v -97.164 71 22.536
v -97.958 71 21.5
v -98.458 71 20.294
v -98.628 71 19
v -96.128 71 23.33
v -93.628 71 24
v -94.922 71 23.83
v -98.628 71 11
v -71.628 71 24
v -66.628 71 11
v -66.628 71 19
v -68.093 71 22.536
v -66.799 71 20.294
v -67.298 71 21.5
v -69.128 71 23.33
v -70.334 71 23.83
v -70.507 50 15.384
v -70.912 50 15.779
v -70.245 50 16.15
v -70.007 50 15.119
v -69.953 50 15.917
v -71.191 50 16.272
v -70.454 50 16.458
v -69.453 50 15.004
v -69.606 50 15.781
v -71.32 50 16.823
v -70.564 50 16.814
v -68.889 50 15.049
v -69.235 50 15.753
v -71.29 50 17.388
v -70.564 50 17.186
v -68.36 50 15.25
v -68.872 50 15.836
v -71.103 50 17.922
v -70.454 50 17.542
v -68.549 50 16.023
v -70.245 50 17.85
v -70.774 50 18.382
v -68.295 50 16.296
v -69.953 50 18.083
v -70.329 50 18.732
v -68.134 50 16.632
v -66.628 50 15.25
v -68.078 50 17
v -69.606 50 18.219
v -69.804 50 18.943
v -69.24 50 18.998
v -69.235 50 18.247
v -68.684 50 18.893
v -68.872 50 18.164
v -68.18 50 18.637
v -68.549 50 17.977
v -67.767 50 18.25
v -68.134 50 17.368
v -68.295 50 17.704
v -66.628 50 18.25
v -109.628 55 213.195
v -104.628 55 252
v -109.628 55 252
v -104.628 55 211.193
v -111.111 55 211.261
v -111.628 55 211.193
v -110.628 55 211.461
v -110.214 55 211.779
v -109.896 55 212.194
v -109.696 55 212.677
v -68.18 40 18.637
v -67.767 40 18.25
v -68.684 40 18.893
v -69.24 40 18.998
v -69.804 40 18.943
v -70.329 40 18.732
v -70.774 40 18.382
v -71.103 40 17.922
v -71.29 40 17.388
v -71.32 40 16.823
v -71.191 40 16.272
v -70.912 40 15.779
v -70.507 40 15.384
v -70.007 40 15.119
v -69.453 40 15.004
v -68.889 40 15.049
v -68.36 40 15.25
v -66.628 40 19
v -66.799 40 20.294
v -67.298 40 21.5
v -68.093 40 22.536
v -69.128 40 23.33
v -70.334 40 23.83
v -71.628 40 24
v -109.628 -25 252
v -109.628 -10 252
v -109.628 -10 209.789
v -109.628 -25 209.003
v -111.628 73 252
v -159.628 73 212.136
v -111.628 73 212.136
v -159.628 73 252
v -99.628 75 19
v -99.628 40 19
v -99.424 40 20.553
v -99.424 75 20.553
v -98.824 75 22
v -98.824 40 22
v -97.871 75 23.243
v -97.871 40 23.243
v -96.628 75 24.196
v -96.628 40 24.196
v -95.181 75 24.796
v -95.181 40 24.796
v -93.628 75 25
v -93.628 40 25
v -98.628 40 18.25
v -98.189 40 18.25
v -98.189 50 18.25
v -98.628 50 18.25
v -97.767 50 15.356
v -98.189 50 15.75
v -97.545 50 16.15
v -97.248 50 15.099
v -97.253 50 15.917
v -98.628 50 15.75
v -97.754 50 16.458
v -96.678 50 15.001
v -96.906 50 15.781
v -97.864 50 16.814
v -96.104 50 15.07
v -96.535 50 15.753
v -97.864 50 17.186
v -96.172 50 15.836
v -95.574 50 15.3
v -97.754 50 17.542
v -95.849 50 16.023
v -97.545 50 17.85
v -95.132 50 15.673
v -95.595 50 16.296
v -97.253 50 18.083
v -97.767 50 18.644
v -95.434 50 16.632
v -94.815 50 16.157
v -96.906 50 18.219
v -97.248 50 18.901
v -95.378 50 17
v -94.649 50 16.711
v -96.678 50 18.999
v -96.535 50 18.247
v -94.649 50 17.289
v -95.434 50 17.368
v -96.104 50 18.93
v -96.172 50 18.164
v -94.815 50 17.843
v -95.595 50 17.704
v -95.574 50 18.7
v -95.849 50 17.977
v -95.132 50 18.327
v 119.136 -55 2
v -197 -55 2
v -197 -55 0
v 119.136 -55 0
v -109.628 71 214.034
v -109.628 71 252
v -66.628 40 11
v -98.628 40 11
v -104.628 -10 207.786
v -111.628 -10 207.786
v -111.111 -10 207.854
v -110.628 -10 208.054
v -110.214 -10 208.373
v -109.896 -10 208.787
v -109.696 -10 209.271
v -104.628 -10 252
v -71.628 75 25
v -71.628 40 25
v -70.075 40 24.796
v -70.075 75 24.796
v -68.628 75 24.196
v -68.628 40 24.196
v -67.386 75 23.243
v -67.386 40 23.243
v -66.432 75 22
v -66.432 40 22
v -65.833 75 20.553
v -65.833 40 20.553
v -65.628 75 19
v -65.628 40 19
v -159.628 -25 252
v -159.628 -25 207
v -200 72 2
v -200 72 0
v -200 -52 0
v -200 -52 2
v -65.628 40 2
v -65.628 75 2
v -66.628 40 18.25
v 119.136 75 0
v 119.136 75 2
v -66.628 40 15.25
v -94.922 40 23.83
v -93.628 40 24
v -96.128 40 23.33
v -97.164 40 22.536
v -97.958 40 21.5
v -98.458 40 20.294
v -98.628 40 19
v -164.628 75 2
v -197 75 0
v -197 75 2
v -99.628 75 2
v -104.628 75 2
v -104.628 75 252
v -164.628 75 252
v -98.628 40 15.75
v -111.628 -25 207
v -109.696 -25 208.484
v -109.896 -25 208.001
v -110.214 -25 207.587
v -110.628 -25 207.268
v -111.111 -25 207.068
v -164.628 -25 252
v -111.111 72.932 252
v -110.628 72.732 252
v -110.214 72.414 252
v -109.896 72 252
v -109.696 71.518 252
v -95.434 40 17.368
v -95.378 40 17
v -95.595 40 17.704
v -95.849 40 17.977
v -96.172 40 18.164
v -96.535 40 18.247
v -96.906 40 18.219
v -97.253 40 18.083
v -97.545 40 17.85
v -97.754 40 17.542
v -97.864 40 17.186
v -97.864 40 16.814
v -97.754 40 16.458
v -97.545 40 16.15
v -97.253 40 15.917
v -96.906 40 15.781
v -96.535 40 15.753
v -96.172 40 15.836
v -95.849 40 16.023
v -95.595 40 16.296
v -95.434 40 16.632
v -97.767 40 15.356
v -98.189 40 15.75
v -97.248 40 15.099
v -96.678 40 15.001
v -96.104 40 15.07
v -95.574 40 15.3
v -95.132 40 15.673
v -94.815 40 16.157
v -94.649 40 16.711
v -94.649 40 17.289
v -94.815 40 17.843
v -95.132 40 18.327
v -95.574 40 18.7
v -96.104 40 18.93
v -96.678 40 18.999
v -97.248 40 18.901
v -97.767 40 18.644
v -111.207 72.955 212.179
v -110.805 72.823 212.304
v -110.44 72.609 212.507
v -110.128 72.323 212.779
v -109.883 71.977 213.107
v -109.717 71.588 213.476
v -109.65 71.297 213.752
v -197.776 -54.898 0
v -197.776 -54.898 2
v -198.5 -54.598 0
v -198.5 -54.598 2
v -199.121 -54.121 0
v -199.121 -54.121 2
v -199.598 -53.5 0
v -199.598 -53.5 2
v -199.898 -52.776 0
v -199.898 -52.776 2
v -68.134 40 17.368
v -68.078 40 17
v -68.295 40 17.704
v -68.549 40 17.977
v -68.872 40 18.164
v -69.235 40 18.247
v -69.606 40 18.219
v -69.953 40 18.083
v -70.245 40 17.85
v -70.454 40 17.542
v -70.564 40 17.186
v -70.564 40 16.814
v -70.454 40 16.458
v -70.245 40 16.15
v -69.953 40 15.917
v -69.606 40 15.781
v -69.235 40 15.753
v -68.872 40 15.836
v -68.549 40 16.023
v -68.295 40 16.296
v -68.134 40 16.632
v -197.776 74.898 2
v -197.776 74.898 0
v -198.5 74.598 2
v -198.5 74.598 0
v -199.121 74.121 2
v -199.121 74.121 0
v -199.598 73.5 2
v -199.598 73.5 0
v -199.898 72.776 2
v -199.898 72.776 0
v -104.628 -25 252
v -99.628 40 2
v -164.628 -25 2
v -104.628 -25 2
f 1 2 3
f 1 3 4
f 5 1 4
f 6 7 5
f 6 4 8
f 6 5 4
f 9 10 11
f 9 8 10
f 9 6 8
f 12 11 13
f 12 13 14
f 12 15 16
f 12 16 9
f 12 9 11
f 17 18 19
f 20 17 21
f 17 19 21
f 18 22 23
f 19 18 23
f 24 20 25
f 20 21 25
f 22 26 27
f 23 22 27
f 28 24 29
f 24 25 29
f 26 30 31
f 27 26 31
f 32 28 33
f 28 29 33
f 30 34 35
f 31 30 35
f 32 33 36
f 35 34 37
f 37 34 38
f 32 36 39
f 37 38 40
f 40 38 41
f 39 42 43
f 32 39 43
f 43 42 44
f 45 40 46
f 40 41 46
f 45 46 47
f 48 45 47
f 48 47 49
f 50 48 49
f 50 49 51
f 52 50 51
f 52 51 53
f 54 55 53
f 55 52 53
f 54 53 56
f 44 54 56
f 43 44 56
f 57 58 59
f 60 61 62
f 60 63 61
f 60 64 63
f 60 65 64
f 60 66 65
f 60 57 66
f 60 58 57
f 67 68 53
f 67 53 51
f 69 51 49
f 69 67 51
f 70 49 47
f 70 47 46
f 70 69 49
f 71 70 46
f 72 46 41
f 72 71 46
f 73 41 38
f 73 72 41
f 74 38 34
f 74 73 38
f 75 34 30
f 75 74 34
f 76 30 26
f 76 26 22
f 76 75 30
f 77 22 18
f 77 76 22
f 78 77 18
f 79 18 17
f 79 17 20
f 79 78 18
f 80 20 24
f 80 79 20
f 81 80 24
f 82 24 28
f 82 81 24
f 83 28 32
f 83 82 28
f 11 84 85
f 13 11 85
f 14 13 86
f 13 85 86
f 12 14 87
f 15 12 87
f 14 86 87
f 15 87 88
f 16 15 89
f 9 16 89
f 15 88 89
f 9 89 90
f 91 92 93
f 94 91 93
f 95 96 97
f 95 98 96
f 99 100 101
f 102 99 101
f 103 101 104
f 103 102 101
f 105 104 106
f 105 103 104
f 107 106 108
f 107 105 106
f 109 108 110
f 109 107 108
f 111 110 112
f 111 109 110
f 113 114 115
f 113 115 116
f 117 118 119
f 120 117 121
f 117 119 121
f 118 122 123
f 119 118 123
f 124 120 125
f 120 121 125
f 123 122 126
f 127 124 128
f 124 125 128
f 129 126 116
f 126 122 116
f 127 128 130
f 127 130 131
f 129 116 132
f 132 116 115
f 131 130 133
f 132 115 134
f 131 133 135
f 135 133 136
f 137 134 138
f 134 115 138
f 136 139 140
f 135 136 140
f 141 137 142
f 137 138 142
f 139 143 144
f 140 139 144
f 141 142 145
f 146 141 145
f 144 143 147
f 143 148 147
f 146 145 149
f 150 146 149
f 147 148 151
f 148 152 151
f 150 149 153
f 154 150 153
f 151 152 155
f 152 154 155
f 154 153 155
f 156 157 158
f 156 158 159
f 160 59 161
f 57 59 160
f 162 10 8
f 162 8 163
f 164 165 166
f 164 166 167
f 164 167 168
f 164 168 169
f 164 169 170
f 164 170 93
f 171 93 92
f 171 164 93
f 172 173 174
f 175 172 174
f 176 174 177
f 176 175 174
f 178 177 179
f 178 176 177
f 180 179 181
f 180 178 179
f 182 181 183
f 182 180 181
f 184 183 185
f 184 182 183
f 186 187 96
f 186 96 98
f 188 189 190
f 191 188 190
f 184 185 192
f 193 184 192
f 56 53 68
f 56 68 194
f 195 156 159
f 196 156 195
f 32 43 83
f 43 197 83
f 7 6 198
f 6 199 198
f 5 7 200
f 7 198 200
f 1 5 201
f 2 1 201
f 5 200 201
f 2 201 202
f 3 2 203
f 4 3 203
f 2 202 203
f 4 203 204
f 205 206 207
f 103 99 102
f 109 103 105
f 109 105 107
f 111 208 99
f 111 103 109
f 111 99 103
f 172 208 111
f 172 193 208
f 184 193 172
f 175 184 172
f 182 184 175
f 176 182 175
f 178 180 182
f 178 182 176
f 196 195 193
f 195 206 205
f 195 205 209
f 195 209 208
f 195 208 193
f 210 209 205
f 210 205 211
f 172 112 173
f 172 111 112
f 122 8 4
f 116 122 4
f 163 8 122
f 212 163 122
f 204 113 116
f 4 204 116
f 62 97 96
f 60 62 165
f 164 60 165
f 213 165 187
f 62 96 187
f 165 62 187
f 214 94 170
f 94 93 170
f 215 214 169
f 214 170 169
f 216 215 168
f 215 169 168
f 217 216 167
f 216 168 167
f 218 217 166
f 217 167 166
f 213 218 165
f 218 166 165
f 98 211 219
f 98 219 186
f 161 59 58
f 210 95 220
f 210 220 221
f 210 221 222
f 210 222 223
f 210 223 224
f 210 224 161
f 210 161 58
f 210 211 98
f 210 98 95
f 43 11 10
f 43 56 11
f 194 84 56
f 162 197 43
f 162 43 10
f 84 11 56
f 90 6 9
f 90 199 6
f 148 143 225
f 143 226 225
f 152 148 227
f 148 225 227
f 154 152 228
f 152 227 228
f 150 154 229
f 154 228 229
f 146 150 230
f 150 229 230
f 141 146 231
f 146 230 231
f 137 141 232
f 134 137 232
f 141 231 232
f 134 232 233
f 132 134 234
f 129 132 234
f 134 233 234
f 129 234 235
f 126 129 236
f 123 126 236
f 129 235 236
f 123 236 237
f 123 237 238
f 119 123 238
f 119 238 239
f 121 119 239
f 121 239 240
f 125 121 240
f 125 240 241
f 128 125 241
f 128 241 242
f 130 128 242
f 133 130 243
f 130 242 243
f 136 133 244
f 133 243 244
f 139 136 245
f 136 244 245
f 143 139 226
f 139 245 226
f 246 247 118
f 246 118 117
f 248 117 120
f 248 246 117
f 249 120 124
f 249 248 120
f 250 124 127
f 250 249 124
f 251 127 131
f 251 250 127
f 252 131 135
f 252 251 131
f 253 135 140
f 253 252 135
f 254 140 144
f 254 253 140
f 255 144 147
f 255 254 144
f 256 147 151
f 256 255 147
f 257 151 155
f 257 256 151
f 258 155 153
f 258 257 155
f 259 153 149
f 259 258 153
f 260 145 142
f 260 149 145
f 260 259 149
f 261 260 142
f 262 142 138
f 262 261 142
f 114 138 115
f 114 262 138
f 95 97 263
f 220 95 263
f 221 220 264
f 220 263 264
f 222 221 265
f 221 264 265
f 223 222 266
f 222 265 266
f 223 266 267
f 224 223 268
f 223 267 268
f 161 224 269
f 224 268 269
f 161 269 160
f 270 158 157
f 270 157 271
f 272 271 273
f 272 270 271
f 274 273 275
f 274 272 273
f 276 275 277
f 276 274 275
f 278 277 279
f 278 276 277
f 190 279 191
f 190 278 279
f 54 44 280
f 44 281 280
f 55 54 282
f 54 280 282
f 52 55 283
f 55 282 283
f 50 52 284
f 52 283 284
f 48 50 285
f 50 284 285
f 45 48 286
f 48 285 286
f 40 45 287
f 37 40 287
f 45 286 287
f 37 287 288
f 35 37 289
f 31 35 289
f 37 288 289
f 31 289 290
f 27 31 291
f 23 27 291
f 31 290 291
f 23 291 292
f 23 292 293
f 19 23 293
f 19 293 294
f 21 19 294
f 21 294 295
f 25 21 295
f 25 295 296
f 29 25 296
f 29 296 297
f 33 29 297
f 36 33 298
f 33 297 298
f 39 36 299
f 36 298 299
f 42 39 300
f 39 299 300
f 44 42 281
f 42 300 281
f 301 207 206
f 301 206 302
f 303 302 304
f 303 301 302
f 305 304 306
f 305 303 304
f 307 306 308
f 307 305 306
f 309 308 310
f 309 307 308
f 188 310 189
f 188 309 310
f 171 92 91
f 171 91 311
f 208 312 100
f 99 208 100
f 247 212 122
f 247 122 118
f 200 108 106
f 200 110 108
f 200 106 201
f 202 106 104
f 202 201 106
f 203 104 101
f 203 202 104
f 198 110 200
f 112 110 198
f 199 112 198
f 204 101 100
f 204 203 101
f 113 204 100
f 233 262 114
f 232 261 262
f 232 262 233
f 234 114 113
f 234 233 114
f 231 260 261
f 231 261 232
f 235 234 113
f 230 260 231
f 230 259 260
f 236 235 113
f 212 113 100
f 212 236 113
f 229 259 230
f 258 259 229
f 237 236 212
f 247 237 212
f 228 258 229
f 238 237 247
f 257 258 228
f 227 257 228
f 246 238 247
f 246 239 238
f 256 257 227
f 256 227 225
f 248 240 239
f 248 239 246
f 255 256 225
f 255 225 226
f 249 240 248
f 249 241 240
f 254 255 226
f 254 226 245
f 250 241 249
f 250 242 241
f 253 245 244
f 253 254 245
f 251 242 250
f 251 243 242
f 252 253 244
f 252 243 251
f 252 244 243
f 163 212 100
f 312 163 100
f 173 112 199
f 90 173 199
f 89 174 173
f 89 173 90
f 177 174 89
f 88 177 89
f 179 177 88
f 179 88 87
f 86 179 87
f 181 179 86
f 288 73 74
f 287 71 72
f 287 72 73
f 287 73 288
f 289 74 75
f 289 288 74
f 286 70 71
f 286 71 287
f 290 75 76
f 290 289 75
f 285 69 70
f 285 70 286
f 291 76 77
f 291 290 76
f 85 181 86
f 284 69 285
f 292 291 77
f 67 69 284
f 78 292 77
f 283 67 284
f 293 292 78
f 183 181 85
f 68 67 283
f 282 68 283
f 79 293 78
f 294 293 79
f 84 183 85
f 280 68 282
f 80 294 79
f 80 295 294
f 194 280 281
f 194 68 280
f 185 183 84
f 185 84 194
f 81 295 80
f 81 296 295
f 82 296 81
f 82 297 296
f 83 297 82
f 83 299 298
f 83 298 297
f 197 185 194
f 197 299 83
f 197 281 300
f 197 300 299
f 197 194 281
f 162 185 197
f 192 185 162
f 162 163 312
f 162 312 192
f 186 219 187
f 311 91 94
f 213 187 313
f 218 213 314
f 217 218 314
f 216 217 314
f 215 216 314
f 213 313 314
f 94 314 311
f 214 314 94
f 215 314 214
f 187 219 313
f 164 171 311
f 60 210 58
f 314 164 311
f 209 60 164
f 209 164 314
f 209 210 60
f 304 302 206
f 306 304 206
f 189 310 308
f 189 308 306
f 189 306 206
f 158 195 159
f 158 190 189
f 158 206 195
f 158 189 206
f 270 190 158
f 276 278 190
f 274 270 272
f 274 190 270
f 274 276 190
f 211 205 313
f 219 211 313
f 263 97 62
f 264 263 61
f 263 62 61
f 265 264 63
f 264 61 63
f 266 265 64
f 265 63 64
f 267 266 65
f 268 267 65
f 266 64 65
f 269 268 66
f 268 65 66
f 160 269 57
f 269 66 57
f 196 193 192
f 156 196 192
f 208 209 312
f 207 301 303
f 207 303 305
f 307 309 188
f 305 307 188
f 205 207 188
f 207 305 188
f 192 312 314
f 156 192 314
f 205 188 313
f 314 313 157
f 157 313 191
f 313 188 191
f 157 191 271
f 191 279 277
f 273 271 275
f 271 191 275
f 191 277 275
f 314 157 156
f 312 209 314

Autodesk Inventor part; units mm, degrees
ref_plane "YZ Plane" through (0, 0, 0) normal (1, 0, 0) x (0, 1, 0)
ref_plane "XZ Plane" through (0, 0, 0) normal (0, 1, 0) x (-1, 0, 0)
sketch "Sketch1" plane through (0, 0, 0) normal (0, 0, 1) x (1, 0, 0)
  line L0 (200, 75) -> (-200, 75)
  line L1 (-200, 75) -> (-200, -75)
  line L2 (-200, -75) -> (200, -75)
  line L3 (200, -75) -> (200, 75)
  line L4 (200, 75) -> (-200, -75) construction
  line L5 (-200, 75) -> (200, -75) construction
  point P0 (0, 0)
  dimension "d0" = 400
  dimension "d1" = 150
extrude "Extrusion1" add sketch "Sketch1" along normal blind 2
sketch "Sketch2" plane through (0, 0, 2) normal (0, 0, 1) x (1, 0, 0)
  line L0 (-200, 0) -> (-155, 56.4222) construction
  line L1 (-155, -56.4222) -> (-200, 0) construction
  line L2 (-104.6282, 75) -> (-164.6282, 75)
  line L3 (-164.6282, 75) -> (-164.6282, -25)
  line L4 (-164.6282, -25) -> (-104.6282, -25)
  line L5 (-104.6282, -25) -> (-104.6282, 75)
  line L6 (-104.6282, 75) -> (-164.6282, -25) construction
  line L7 (-164.6282, 75) -> (-104.6282, -25) construction
  line L8 (200, 75) -> (-200, 75) projected
  point P0 (0, 0)
  point P1 (-134.6282, 25)
  dimension "d5" = 60
  dimension "d6" = 100
  dimension "d55" = 0
extrude "Extrusion2" add sketch "Sketch2" along normal blind 250
sketch "Sketch3" plane through (-104.6282, -25, 2) normal (1, 0, 0) x (0, 0, -1)
  line L0 (0, 0) -> (-250, 0) projected
  line L1 (0, -50) -> (0, 100) projected
  line L2 (0, 100) -> (-250, 100) projected
  line L3 (-250, 0) -> (-250, 100) projected
  line L4 (0, 20) -> (-150, 20)
  line L5 (-150, 80) -> (0, 80)
  line L6 (0, 20) -> (0, 80)
  line L7 (-150, 80) -> (-150, 20)
  point P0 (2, 25)
  dimension "d27" = 20
  dimension "d28" = 20
extrude "Extrusion3" cut sketch "Sketch3" against normal blind 300 contours L4 L7 L5 L1
sketch "Sketch4" plane through (-104.6282, -25, 252) normal (1, 0, 0) x (0, 0, -1)
  line L0 (0, 100) -> (0, 0) projected
  line L1 (0, 80) -> (45, 80)
  line L2 (45, 80) -> (45, 15)
  line L3 (0, 15) -> (0, 80)
  line L4 (45, 15) -> (0, 15)
  line L5 (0, 0) -> (0, 100) projected
  line L6 (0, 15) -> (0, 80)
  point P0 (252, 25)
  dimension "d30" = 65
  dimension "d31" = 15
  dimension "d32" = 45
  dimension "d37" = 65
extrude "Extrusion4" cut sketch "Sketch4" against normal blind 55
sketch "Sketch6" plane through (-104.6282, 55, 207) normal (0, -1, 0) x (1, 0, 0)
  line L0 (0, 0) -> (0, 45) projected
  line L1 (0, 0) -> (-55, 0) projected
  line L2 (-55, 0) -> (-55, 45) projected
  line L3 (0, 45) -> (-55, 45) projected
  line L4 (-55, 45) -> (0, 45) projected
  line L5 (0, 45) -> (0, 0)
  line L6 (-5, 45) -> (-5, 0)
  line L7 (-55, 45) -> (-5, 45)
  line L8 (-55, 0) -> (-5, 0)
  line L9 (-55, 45) -> (-55, 0)
  point P0 (104.6282, -207)
  dimension "d40" = 5
extrude "Extrusion5" cut sketch "Sketch6" against normal blind 18 contours L1 L2 L3 L6
sketch "Sketch7" plane through (-104.6282, -10, 252) normal (0, 1, 0) x (1, 0, 0)
  line L0 (-55, 0) -> (-5, 0) projected
  line L1 (-55, 45) -> (-55, 0) projected
  line L2 (-5, 45) -> (-55, 45) projected
  line L3 (-5, 0) -> (-5, 45) projected
  line L4 (-5, 0) -> (-55, 0)
  line L5 (-55, 0) -> (-55, 45)
  line L6 (-55, 45) -> (-5, 45)
  line L7 (-5, 45) -> (-5, 0)
  point P0 (104.6282, 252)
extrude "Extrusion6" cut sketch "Sketch7" against normal through all
sketch "Sketch10" plane through (-159.6282, -25, 252) normal (1, 0, 0) x (0, 0, -1)
  line L0 (45, 98) -> (0, 98) projected
  line L1 (45, 98) -> (45, 0) projected
  line L2 (39.864, 98) -> (45, 0)
  line L3 (45, 0) -> (45, 98)
  line L4 (0, 80) -> (0, 100) projected
  line L5 (45, 98) -> (39.864, 98)
  point P0 (252, 25)
  dimension "d50" = 3
extrude "Extrusion7" add sketch "Sketch10" along normal blind 55
fillet "Fillet3" radius 2 3 edges at (-109.6282, 73, 232.068) (-109.6282, -17.5, 207.3931) (-109.6282, 64, 211.6643)
sketch "Sketch11" plane through (0, 0, 2) normal (0, 0, 1) x (1, 0, 0)
  line L0 (-104.6282, -5) -> (-104.6282, 55) projected
  point P0 (0, 0)
  point P1 (-104.6282, 75)
sketch "Sketch12" plane through (-104.6282, -25, 252) normal (1, 0, 0) x (0, 0, -1)
  line L0 (250, 20) -> (100, 20) projected
  line L1 (100, 80) -> (250, 80) projected
  arc A0 (100, 80) -> (100, 20) centre (100, 50) ccw projected
  line L2 (247, 20) -> (250, 20)
  line L3 (247, 80) -> (250, 80)
  line L4 (250, -50) -> (250, 100) projected
  point P0 (252, 25)
  point P1 (250, 22.1792)
  point P2 (250, 77.8208)
  dimension "d57" = 3
extrude "Extrusion8" add sketch "Sketch12" against normal blind 60
ref_plane "Work Plane2" through (-200, 75, 0) normal (0, 1, 0) x (1, 0, 0)
sketch "Sketch15" plane through (-200, 75, 0) normal (0, 1, 0) x (1, 0, 0)
  line L0 (95.3718, -2) -> (95.3718, -252) projected
  line L1 (400, -2) -> (95.3718, -2) projected
  line L2 (100.3718, -11) -> (100.3718, -19)
  line L3 (106.3718, -25) -> (128.3718, -25)
  line L4 (134.3718, -19) -> (134.3718, -11)
  arc A0 (128.3718, -25) -> (134.3718, -19) centre (128.3718, -19) ccw
  arc A1 (100.3718, -19) -> (106.3718, -25) centre (106.3718, -19) ccw
  line L5 (134.3718, -11) -> (100.3718, -11)
  line L6 (100.3718, -11) -> (134.3718, -11)
  line L7 (134.3718, -11) -> (134.3718, -2)
  line L8 (134.3718, -2) -> (100.3718, -2)
  line L9 (100.3718, -2) -> (100.3718, -11)
  point P0 (200, 0)
  point P1 (100.3718, -25)
  point P2 (134.3718, -25)
  dimension "d78" = 14
  dimension "d79" = 34
  dimension "d80" = 6
  dimension "d81" = 5
extrude "Extrusion10" add sketch "Sketch15" against normal blind 35 contours L4 A0 L3 A1 L2 L5
sketch "Sketch16" plane through (-200, 40, 0) normal (0, -1, 0) x (1, 0, 0)
  line L0 (128.3718, 25) -> (106.3718, 25) projected
  arc A0 (134.3718, 19) -> (128.3718, 25) centre (128.3718, 19) ccw projected
  arc A1 (106.3718, 25) -> (100.3718, 19) centre (106.3718, 19) ccw projected
  line L1 (134.3718, 11) -> (134.3718, 19) projected
  arc A2 (134.3718, 19) -> (128.3718, 25) centre (128.3718, 19) ccw projected
  line L2 (128.3718, 25) -> (106.3718, 25) projected
  arc A3 (106.3718, 25) -> (100.3718, 19) centre (106.3718, 19) ccw projected
  line L3 (100.3718, 19) -> (100.3718, 11) projected
  line L4 (133.3718, 19) -> (133.3718, 3)
  line L5 (133.3718, 3) -> (101.3718, 3)
  line L6 (101.3718, 3) -> (101.3718, 19)
  arc A4 (106.3718, 24) -> (101.3718, 19) centre (106.3718, 19) ccw
  line L7 (106.3718, 24) -> (128.3718, 24)
  arc A5 (133.3718, 19) -> (128.3718, 24) centre (128.3718, 19) ccw
  line L8 (100.3718, 11) -> (134.3718, 11) projected
  point P0 (200, 0)
  dimension "d85" = 1
extrude "Extrusion11" cut sketch "Sketch16" against normal blind 31 contours L8 L6 A4 L7 A5 L4 | L4 L5 L6 L8
fillet "Fillet4" radius 3 1 edges at (-200, -75, 1)
fillet "Fillet5" radius 3 1 edges at (-200, 75, 1)
fillet "Fillet6" radius 3 2 edges at (200, -75, 1) (200, 75, 1)
sketch "Sketch18" plane through (200, -72, 0) normal (1, 0, 0) x (0, 0, -1)
  line L0 (-2, 144) -> (0, 144) projected
  line L1 (-2, 0) -> (-2, 144) projected
  line L2 (0, 0) -> (-2, 0) projected
  line L3 (0, 0) -> (0, 144) projected
  line L4 (-2, 147) -> (-2, 144) projected
  line L5 (-2, 144) -> (0, 144) projected
  line L6 (0, 144) -> (0, 147) projected
  line L7 (0, 147) -> (-2, 147) projected
  line L8 (-2, 0) -> (-2, -3) projected
  line L9 (-2, -3) -> (0, -3) projected
  line L10 (0, -3) -> (0, 0) projected
  line L11 (0, 0) -> (-2, 0) projected
  point P0 (0, 72)
extrude "Extrusion12" cut sketch "Sketch18" against normal blind 50
sketch "Sketch19" plane through (-197, -75, 0) normal (0, -1, 0) x (1, 0, 0)
  line L0 (347, 0) -> (347, 2) projected
  line L1 (0, 2) -> (347, 2) projected
  line L2 (0, 0) -> (0, 2) projected
  line L3 (0, 0) -> (347, 0) projected
  line L4 (0, 2) -> (-3, 2) projected
  line L5 (-3, 2) -> (-3, 0) projected
  line L6 (-3, 0) -> (0, 0) projected
  line L7 (0, 0) -> (0, 2) projected
  point P0 (197, 0)
extrude "Extrusion13" cut sketch "Sketch19" against normal blind 20
fillet "Fillet7" radius 3 2 edges at (150, -55, 1) (150, 75, 1)
fillet "Fillet8" radius 3 1 edges at (-200, -55, 1)
sketch "Sketch20" plane through (-200, 75, 0) normal (0, 1, 0) x (1, 0, 0)
  line L0 (134.3718, -11) -> (134.3718, -19) projected
  line L1 (347, -2) -> (95.3718, -2) projected
  line L2 (134.3718, -11) -> (100, -11)
  line L3 (100, -11) -> (100, -2)
  line L4 (100, -2) -> (134.3718, -2)
  line L5 (134.3718, -2) -> (134.3718, -11)
  point P0 (200, 0)
sketch "Sketch21" plane through (-65.6282, 75, 19) normal (1, 0, 0) x (0, 0, -1)
  line L0 (0, -35) -> (8, -35) projected
  line L1 (17, -100) -> (17, 0) projected
  line L2 (8, -35) -> (17, -35)
  line L3 (17, -35) -> (17, 0)
  line L4 (17, 0) -> (8, 0)
  line L5 (8, 0) -> (8, -35)
  point P0 (19, -75)
  point P1 (17, -22.1792)
extrude "Extrusion14" add sketch "Sketch21" against normal blind 37.5
sketch "Sketch22" plane through (-103.1282, 75, 11) normal (0, 0, 1) x (1, 0, 0)
  point P0 (103.1282, -75)
sketch "Sketch23" plane through (-103.1282, 75, 11) normal (0, 0, 1) x (1, 0, 0)
  line L0 (3.5, 0) -> (0, 0) projected
  line L1 (0, 0) -> (3.5, 0)
  line L2 (3.5, 0) -> (3.5, -35)
  line L3 (3.5, -35) -> (0, -35)
  line L4 (0, -35) -> (0, 0)
  line L5 (37.5, 0) -> (41, 0)
  line L6 (41, 0) -> (41, -35)
  line L7 (41, -35) -> (37.5, -35)
  line L8 (37.5, -35) -> (37.5, 0)
  line L9 (37.5, 0) -> (37.5, -35) projected
  point P0 (103.1282, -75)
  dimension "d100" = 3.5
  dimension "d101" = 0
sketch "Sketch24" plane through (-200, 40, 0) normal (0, -1, 0) x (1, 0, 0)
  line L0 (133.3718, 11) -> (101.3718, 11) projected
  line L1 (117.3718, 11) -> (117.3718, 2) construction
  line L2 (134.3718, 2) -> (96.8718, 2) projected
  line L3 (134.3718, 19) -> (134.3718, 2) projected
  line L4 (134.3718, 11) -> (134.3718, 2)
  line L5 (100.3718, 11) -> (100.3718, 2)
  line L6 (96.8718, 11) -> (100.3718, 11)
  line L7 (100.3718, 11) -> (100.3718, 2)
  line L8 (100.3718, 2) -> (96.8718, 2)
  line L9 (96.8718, 2) -> (96.8718, 11)
  point P0 (200, 0)
  point P1 (96.8718, 2)
extrude "Extrusion17" cut sketch "Sketch24" against normal through all
sketch "Sketch26" plane through (-200, 40, 0) normal (0, -1, 0) x (1, 0, 0)
  line L0 (101.3718, 11) -> (101.3718, 19) projected
  line L1 (101.3718, 17) -> (103.3718, 17)
  line L2 (133.3718, 11) -> (101.3718, 11) projected
  circle A0 centre (103.3718, 17) radius 2
  line L3 (133.3718, 17) -> (131.6357, 17)
  circle A1 centre (103.3718, 17) radius 1.25
  line L4 (103.3718, 18.25) -> (101.3718, 18.25)
  line L5 (101.3718, 18.25) -> (101.3718, 15.75)
  line L6 (101.3718, 15.75) -> (103.3718, 15.75)
  line L7 (103.3718, 15.75) -> (103.3718, 18.25)
  circle A2 centre (130.6718, 17) radius 2
  circle A3 centre (130.6718, 17) radius 1.25
  line L8 (133.3718, 19) -> (133.3718, 11) projected
  line L9 (130.6718, 18.25) -> (133.3718, 18.25)
  line L10 (133.3718, 18.25) -> (133.3718, 15.25)
  line L11 (133.3718, 15.25) -> (130.6718, 15.25)
  line L12 (130.6718, 15.25) -> (130.6718, 18.25)
  point P0 (200, 0)
  point P1 (132.233, 18.25)
  point P2 (131.64, 15.25)
  point P3 (101.8105, 15.75)
  point P4 (101.8105, 18.25)
  dimension "d116" = 2.5
  dimension "d118" = 2.5
  dimension "d119" = 27.3
  dimension "d112" = 6
  dimension "d113" = 4
  dimension "d117" = 4
extrude "Extrusion18" add sketch "Sketch26" against normal blind 10
extrude "Extrusion19" cut sketch "Sketch26" against normal blind 10 contours A1 L7 L1 | L1 L7 A1 | L7 A1 | A3 L12 | L12 A3
thread "Thread3" size "M2.5x0.45" class "6H" standard "ANSI Metric M Profile" length 72
thread "Thread4" size "M2.5x0.45" class "6H" standard "ANSI Metric M Profile" length 72
sketch "Sketch28" plane through (150, -72, 0) normal (1, 0, 0) x (0, 0, -1)
  line L0 (0, 144) -> (0, 20) projected
  line L1 (-2, 20) -> (0, 20)
  line L2 (0, 20) -> (0, 144)
  line L3 (0, 144) -> (-2, 144)
  line L4 (-2, 144) -> (-2, 20)
  point P0 (0, 72)
extrude "Extrusion21" add sketch "Sketch28" along normal blind 50
sketch "Sketch29" plane through (0, 0, 2) normal (0, 0, 1) x (1, 0, 0)
  line L0 (200, 72) -> (200, -52) projected
  line L1 (200, 72) -> (200, -52)
  line L2 (200, 10) -> (160.5, 10)
  line L3 (160.5, 10) -> (160.5, 16)
  line L4 (160.5, 16) -> (115.5, 16)
  line L5 (115.5, 16) -> (115.5, 4)
  line L6 (115.5, 4) -> (160.5, 4)
  line L7 (160.5, 4) -> (160.5, 16)
  point P0 (0, 0)
  dimension "d136" = 39.5
  dimension "d137" = 6
  dimension "d138" = 45
  dimension "d139" = 12
sketch "Sketch31" plane through (0, 0, 2) normal (0, 0, 1) x (1, 0, 0)
  line L0 (147, 75) -> (-65.6282, 75) projected
  line L1 (119.1362, 75) -> (234.7266, 75)
  line L2 (234.7266, 75) -> (234.7266, -58.1498)
  line L3 (234.7266, -58.1498) -> (119.1362, -58.1498)
  line L4 (119.1362, -58.1498) -> (119.1362, 75)
  point P0 (0, 0)
extrude "Extrusion24" cut sketch "Sketch31" against normal blind 10
properties part number "lifting base" material "PPS Plastic"
